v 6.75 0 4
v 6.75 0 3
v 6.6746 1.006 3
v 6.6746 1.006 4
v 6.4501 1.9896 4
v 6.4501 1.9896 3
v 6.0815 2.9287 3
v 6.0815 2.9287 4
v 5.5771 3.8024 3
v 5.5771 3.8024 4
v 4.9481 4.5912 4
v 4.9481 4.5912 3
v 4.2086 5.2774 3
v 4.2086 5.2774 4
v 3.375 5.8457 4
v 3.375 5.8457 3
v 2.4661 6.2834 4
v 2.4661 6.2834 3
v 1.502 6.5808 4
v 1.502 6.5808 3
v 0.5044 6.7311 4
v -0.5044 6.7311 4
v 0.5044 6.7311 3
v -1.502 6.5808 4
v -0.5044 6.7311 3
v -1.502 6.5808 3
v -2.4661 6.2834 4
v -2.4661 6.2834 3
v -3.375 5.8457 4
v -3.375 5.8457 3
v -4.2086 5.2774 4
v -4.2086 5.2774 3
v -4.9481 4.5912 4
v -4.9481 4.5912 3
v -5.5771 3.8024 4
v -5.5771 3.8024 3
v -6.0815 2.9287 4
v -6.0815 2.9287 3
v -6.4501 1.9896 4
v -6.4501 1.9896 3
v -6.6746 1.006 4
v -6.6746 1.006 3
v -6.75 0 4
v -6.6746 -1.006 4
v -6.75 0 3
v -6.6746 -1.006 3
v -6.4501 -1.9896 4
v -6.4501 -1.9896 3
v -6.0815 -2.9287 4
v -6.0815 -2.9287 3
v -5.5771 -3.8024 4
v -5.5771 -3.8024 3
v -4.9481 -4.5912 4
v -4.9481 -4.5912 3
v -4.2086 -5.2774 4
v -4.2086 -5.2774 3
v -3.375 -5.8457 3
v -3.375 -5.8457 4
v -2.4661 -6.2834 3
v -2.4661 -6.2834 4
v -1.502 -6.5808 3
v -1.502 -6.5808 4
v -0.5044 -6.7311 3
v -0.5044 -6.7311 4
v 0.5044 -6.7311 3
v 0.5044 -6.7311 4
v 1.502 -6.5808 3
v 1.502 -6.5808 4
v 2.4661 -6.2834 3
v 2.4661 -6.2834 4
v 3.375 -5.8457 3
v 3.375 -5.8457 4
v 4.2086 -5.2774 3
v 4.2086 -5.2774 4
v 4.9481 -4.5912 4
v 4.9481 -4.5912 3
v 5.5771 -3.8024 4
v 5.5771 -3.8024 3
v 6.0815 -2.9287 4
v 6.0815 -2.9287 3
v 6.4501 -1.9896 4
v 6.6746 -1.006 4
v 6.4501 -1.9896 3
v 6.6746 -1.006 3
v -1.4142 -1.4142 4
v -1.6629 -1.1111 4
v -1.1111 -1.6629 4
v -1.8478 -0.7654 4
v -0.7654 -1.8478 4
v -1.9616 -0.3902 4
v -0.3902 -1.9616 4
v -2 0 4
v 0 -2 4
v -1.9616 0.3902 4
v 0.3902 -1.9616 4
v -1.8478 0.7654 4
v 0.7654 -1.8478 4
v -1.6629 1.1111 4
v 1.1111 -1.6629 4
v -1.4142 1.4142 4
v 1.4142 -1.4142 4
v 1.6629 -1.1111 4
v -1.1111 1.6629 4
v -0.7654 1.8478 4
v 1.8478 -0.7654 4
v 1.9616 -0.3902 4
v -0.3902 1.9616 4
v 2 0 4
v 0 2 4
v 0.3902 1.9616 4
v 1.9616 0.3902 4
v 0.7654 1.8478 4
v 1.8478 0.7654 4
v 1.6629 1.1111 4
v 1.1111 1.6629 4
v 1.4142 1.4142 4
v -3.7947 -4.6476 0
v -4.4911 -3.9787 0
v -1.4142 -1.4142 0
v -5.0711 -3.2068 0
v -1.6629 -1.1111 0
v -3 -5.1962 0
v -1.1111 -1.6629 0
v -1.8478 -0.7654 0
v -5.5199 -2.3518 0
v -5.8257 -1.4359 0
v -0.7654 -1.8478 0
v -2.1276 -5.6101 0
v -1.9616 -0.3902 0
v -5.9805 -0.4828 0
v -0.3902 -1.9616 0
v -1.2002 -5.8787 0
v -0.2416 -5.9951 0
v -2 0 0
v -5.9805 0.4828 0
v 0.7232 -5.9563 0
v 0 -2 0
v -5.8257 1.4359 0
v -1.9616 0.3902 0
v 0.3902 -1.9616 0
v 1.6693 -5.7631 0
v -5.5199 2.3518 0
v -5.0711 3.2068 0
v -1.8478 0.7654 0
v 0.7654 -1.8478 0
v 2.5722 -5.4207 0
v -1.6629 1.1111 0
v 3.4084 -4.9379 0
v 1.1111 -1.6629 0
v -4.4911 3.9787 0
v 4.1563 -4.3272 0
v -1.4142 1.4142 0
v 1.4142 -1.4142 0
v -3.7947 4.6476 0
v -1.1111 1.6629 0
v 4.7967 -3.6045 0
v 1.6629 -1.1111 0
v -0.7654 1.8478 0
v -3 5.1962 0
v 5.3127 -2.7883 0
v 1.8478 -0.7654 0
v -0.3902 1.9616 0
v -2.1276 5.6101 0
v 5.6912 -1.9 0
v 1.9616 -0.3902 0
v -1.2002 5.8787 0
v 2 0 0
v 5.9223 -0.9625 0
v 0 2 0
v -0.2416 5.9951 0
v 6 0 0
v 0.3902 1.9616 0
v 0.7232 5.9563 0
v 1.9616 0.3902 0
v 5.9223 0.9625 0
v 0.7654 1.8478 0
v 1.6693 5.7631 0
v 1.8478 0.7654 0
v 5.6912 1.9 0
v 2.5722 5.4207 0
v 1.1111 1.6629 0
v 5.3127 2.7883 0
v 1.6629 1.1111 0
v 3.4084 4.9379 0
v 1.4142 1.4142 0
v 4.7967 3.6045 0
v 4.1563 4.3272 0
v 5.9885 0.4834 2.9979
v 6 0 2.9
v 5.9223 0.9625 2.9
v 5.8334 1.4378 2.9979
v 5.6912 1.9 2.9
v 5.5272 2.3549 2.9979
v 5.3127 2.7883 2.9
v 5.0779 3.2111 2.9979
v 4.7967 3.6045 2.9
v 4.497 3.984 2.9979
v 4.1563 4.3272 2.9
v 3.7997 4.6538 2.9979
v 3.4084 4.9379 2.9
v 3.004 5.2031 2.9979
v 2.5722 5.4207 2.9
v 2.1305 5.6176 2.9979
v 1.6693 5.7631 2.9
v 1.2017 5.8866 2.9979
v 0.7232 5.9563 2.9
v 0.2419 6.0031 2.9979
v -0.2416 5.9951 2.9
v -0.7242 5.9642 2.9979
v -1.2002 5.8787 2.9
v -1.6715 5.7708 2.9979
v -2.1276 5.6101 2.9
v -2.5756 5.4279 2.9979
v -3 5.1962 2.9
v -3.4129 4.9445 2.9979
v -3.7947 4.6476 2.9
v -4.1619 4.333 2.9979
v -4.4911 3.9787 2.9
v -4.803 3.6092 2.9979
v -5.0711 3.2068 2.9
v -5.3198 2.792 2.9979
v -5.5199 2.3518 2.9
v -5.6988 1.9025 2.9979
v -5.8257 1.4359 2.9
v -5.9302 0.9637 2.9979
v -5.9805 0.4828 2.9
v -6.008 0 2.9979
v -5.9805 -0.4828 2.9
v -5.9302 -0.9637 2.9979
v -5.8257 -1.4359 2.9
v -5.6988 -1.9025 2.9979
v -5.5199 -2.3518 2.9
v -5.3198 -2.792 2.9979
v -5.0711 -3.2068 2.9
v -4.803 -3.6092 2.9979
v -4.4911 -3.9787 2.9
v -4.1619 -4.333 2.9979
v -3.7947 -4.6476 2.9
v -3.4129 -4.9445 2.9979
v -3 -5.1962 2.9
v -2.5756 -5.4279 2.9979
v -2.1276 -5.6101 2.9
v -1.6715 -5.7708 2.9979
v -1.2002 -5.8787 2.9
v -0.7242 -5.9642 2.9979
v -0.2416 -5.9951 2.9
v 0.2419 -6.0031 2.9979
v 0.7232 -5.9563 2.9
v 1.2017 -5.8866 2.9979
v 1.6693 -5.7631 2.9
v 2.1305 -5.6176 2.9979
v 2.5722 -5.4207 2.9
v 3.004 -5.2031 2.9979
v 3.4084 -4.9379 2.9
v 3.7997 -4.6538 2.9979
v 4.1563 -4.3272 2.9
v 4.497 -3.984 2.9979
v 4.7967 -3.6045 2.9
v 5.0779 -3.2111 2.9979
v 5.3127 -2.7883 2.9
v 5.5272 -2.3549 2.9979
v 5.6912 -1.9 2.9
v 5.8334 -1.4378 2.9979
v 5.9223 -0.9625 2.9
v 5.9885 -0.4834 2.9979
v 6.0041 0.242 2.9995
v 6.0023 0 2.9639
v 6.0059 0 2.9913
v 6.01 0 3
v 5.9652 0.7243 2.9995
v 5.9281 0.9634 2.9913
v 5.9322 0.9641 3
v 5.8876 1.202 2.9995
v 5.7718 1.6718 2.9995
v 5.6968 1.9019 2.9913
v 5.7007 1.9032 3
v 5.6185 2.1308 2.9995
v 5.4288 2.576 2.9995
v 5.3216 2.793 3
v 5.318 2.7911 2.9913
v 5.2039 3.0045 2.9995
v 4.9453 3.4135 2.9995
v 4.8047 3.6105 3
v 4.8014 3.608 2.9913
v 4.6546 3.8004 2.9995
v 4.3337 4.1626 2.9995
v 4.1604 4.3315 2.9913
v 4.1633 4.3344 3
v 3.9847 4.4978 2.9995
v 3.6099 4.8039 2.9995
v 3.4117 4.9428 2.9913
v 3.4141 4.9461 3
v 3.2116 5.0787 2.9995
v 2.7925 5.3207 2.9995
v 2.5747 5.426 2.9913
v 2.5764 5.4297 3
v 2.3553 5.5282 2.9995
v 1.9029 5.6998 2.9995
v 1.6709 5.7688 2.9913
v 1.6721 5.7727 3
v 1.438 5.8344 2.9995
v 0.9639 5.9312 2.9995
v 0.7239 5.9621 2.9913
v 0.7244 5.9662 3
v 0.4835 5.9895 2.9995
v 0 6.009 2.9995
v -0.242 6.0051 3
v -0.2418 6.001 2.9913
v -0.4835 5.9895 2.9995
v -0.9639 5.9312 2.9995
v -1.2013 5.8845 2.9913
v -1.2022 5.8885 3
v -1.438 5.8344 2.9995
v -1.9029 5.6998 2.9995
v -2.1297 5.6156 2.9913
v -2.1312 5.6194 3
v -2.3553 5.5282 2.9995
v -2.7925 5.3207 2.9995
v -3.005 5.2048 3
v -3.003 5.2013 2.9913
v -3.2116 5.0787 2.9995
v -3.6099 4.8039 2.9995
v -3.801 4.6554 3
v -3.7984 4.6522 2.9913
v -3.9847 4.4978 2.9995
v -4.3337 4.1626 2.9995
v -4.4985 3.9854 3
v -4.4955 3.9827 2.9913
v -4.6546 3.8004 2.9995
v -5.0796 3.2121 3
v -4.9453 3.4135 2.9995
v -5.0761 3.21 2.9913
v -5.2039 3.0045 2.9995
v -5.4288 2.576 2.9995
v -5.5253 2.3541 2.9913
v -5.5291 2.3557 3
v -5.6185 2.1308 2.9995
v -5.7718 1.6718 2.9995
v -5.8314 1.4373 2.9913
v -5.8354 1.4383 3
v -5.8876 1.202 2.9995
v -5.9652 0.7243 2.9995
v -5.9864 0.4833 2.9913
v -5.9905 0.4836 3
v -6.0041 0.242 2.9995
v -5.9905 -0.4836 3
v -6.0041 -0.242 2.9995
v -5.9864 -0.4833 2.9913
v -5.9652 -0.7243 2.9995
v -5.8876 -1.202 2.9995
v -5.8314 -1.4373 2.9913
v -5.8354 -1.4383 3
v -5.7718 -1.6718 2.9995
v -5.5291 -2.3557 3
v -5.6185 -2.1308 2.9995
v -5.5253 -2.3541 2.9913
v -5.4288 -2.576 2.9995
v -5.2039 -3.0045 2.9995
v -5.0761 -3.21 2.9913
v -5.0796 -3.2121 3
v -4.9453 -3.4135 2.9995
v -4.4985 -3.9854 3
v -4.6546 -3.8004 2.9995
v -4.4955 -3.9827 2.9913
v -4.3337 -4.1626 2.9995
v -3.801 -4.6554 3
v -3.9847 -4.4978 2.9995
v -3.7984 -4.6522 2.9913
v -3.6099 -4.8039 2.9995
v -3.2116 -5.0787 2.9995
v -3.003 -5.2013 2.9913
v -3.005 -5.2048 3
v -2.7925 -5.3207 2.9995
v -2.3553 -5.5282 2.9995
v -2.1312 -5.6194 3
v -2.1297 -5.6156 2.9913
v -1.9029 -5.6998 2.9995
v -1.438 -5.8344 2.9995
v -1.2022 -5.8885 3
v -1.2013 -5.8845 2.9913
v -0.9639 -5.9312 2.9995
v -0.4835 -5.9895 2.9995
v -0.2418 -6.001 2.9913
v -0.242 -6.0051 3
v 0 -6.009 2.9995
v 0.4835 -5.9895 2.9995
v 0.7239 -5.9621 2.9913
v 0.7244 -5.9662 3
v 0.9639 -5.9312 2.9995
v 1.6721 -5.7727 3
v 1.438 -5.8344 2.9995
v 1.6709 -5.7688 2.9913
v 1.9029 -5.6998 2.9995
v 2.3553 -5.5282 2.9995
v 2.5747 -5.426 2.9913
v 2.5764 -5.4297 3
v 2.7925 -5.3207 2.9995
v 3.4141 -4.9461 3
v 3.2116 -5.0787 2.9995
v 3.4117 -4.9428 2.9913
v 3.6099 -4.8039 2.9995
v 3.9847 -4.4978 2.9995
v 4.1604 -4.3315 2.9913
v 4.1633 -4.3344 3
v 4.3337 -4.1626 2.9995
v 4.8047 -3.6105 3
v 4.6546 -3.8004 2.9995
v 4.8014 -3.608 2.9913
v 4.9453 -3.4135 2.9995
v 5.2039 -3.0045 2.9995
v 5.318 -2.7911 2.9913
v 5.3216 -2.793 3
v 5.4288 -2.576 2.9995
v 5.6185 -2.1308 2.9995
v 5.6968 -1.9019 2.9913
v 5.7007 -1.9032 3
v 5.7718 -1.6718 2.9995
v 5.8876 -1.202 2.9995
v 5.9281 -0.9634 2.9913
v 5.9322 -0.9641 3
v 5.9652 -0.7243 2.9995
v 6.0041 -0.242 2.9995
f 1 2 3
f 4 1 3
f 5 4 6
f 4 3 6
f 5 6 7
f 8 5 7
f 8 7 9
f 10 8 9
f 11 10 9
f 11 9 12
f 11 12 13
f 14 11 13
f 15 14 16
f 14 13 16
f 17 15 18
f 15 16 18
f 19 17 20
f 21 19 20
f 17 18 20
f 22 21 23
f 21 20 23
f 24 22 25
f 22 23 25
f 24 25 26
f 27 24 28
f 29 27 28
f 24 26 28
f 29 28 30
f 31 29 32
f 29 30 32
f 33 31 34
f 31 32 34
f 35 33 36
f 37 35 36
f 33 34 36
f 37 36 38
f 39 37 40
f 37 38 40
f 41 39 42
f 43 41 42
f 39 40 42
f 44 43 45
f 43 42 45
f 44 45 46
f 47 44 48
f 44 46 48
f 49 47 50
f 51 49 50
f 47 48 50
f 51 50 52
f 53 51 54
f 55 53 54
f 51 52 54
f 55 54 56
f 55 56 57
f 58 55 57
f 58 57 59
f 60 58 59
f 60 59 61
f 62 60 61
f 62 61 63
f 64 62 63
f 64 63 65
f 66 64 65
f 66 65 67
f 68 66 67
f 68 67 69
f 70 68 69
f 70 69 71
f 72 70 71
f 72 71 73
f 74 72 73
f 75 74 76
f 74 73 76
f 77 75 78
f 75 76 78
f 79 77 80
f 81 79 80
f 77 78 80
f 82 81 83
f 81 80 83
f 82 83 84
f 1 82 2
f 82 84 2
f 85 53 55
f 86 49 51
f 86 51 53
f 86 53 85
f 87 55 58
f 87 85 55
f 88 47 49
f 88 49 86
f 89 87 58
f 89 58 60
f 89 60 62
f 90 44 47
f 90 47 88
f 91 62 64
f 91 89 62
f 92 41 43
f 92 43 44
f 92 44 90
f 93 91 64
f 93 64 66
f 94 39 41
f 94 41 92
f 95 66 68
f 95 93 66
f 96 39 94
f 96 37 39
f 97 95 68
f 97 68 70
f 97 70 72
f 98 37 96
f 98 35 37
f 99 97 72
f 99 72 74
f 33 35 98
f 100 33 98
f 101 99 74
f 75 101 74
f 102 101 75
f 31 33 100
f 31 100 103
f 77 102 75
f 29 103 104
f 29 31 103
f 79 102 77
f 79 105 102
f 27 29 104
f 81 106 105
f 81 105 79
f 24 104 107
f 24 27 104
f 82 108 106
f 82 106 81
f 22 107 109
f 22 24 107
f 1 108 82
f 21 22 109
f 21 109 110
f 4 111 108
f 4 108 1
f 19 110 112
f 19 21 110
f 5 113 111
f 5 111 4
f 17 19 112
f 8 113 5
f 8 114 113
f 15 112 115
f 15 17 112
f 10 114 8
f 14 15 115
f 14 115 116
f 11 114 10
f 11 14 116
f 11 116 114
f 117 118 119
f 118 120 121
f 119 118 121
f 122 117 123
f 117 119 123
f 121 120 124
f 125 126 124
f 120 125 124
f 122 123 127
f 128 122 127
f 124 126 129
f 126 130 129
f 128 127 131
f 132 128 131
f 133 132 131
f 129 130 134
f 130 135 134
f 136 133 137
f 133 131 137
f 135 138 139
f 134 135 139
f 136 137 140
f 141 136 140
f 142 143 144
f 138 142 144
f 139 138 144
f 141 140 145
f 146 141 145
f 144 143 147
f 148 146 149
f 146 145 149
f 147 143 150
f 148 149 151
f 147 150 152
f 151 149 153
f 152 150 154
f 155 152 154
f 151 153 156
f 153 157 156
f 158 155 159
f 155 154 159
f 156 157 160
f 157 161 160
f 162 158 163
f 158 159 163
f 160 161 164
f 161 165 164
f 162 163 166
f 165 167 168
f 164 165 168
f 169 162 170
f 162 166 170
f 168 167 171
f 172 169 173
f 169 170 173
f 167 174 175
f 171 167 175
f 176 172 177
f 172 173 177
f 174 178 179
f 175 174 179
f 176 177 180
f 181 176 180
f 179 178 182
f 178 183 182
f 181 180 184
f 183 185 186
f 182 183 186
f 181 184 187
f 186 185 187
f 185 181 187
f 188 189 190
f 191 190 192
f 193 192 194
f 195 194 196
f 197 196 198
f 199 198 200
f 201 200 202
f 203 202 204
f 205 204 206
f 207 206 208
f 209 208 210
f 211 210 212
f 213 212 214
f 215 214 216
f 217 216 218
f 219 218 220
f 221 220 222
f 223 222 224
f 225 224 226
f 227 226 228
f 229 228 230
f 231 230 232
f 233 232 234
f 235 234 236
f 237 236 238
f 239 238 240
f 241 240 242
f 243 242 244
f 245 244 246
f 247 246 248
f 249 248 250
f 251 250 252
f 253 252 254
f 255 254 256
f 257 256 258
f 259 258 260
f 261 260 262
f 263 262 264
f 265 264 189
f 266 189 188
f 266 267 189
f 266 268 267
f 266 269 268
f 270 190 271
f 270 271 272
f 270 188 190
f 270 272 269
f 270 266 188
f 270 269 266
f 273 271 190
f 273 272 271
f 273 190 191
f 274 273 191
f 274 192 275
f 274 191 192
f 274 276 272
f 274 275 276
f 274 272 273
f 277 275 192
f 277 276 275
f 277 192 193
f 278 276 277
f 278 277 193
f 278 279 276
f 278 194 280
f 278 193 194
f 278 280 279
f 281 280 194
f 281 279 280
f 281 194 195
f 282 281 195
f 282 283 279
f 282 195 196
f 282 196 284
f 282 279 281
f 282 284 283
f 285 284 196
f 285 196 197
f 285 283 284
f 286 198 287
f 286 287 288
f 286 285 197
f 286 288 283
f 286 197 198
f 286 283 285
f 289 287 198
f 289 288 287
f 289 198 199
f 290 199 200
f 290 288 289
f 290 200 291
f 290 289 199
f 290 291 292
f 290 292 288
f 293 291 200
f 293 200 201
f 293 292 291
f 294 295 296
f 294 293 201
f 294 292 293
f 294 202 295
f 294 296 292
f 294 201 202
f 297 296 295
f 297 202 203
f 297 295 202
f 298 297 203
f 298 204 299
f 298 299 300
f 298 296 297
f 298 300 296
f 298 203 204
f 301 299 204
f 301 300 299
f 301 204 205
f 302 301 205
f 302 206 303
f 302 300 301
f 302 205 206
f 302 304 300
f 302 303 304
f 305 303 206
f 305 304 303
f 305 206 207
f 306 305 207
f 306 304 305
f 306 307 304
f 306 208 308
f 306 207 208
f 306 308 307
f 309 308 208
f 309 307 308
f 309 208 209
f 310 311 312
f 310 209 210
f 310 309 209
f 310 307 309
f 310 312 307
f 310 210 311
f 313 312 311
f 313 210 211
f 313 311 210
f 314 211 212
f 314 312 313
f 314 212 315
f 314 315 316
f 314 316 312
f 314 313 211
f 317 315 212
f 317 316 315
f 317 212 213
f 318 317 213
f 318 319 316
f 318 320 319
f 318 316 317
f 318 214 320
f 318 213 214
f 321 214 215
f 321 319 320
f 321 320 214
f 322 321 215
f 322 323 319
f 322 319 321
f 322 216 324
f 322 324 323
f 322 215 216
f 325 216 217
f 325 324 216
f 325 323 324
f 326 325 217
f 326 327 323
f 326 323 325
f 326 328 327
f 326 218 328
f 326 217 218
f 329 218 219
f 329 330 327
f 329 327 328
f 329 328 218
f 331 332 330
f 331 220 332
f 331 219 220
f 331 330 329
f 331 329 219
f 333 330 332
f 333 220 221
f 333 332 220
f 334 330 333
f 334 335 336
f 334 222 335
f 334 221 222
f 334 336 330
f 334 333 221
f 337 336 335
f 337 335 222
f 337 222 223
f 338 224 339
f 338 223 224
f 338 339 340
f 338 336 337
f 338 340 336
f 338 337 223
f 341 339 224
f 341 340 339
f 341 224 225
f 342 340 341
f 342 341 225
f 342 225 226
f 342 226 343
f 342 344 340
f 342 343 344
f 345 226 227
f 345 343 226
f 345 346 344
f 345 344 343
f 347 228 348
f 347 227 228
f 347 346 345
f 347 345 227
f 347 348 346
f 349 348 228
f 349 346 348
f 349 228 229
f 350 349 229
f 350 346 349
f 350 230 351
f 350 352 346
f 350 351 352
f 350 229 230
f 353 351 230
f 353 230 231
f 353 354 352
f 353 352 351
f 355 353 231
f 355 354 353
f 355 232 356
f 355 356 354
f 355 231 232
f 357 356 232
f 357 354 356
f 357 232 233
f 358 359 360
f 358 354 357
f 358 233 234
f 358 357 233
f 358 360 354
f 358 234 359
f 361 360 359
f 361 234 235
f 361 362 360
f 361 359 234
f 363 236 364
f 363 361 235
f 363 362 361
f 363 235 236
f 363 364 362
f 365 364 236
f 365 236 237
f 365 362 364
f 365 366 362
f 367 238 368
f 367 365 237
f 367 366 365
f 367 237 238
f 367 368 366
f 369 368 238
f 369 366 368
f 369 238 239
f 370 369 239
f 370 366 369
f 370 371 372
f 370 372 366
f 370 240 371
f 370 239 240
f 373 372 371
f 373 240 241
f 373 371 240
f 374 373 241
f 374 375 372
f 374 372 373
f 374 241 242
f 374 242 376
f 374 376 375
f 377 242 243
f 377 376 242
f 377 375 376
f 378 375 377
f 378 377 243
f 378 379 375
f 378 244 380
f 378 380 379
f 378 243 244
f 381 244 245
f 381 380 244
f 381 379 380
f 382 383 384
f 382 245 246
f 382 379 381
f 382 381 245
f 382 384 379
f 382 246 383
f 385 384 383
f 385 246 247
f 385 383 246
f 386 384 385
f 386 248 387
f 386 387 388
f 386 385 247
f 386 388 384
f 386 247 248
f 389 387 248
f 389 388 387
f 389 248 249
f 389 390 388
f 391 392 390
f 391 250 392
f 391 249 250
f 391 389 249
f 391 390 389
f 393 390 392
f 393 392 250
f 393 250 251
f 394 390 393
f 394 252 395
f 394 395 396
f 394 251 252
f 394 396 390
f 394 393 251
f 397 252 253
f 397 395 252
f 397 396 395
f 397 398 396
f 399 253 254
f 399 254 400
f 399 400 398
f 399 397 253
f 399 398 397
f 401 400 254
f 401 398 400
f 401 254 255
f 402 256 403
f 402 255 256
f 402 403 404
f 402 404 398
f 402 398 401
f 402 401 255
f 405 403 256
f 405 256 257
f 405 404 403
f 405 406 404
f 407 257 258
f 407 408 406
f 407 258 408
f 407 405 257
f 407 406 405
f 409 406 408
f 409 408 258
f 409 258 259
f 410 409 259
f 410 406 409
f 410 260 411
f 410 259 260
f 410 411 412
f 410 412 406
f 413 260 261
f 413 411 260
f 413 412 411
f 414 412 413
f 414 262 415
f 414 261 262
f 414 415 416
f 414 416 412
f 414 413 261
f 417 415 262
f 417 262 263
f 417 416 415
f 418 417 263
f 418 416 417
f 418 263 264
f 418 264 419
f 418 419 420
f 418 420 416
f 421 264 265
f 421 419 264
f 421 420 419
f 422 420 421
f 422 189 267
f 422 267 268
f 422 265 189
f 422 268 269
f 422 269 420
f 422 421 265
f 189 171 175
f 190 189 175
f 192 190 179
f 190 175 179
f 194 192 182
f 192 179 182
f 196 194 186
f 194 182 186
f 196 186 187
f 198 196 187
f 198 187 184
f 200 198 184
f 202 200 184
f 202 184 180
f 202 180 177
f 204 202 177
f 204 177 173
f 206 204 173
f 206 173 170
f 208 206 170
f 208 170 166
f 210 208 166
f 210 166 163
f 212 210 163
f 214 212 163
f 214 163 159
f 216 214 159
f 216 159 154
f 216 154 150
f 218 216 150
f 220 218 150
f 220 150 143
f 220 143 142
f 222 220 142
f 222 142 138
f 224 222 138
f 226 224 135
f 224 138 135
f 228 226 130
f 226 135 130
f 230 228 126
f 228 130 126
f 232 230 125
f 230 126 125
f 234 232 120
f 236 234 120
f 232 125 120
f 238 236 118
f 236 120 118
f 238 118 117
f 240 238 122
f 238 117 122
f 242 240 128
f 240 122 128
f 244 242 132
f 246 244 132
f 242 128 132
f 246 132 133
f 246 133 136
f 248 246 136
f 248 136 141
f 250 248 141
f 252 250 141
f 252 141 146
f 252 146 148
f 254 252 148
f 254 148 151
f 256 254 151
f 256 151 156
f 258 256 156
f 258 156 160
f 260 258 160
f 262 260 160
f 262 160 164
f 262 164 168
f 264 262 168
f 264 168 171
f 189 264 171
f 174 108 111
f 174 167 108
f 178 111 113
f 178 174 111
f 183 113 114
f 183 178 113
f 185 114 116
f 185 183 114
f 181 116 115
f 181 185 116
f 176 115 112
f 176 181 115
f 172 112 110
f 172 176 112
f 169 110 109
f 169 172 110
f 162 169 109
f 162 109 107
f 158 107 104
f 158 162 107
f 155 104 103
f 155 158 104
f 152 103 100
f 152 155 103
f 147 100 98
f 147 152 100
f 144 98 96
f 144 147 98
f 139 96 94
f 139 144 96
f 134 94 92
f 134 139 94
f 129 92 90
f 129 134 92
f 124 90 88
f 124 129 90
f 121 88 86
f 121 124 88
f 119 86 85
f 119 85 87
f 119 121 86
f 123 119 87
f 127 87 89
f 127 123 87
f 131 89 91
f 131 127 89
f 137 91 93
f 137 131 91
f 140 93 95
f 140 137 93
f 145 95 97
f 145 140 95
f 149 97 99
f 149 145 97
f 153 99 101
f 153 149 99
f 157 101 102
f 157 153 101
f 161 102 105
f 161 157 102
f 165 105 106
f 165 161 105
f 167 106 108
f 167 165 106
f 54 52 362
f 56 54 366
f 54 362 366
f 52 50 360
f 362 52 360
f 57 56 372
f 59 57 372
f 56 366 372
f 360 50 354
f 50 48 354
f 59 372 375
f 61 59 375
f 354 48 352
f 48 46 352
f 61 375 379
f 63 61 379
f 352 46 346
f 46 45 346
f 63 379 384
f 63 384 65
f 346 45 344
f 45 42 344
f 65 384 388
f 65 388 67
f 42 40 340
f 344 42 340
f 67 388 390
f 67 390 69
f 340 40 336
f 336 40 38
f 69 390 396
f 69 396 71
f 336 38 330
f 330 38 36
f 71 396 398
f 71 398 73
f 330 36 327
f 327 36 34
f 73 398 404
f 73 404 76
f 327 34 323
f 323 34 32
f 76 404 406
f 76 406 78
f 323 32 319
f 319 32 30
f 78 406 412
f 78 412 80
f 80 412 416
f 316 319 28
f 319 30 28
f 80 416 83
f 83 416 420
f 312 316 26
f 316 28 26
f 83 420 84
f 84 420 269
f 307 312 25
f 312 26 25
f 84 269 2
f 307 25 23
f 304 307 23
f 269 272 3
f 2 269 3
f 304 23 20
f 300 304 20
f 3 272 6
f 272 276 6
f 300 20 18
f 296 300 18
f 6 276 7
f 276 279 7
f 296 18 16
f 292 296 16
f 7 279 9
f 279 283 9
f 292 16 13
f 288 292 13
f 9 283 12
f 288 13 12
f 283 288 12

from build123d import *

# Parameters (mm, degrees)
SKETCH1_R           = 6
SKETCH1_R_2         = 2
BOSS_EXTRUDE1_DEPTH = 3
SKETCH2_R           = 6.75
SKETCH2_R_2         = 2
BOSS_EXTRUDE2_DEPTH = 1
FILLET1_SIZE        = 0.1
FILLET1_SIZE_2      = 0.01


with BuildPart() as part:
    # Sketch1 → Boss-Extrude1 (new body)
    with BuildSketch(Plane.XY):
        Circle(SKETCH1_R)
        Circle(SKETCH1_R_2, mode=Mode.SUBTRACT)
    extrude(amount=BOSS_EXTRUDE1_DEPTH)

    # Sketch2 → Boss-Extrude2 (add)
    with BuildSketch(Plane.XY.offset(3)):
        Circle(SKETCH2_R)
        Circle(SKETCH2_R_2, mode=Mode.SUBTRACT)
    extrude(amount=BOSS_EXTRUDE2_DEPTH)

    # Fillet1
    # an asymmetric fillet: 0.1, 0.01 mm, written as the material it adds along each edge
    with BuildSketch(Plane(origin=(0, 0, 3), x_dir=(1, 0, 0), z_dir=(0, -1, 0))) as fillet1_piece_1:
        with BuildLine():
            Bezier((6, -FILLET1_SIZE), (6, 0), (6 + FILLET1_SIZE_2, 0), weights=[1, 0.707106781, 1])
            Line((6 + FILLET1_SIZE_2, 0), (6, 0))
            Line((6, 0), (6, -FILLET1_SIZE))
        make_face()
    revolve(axis=Axis((0, 0, 3), (0, 0, 1)))


solid = part.part
